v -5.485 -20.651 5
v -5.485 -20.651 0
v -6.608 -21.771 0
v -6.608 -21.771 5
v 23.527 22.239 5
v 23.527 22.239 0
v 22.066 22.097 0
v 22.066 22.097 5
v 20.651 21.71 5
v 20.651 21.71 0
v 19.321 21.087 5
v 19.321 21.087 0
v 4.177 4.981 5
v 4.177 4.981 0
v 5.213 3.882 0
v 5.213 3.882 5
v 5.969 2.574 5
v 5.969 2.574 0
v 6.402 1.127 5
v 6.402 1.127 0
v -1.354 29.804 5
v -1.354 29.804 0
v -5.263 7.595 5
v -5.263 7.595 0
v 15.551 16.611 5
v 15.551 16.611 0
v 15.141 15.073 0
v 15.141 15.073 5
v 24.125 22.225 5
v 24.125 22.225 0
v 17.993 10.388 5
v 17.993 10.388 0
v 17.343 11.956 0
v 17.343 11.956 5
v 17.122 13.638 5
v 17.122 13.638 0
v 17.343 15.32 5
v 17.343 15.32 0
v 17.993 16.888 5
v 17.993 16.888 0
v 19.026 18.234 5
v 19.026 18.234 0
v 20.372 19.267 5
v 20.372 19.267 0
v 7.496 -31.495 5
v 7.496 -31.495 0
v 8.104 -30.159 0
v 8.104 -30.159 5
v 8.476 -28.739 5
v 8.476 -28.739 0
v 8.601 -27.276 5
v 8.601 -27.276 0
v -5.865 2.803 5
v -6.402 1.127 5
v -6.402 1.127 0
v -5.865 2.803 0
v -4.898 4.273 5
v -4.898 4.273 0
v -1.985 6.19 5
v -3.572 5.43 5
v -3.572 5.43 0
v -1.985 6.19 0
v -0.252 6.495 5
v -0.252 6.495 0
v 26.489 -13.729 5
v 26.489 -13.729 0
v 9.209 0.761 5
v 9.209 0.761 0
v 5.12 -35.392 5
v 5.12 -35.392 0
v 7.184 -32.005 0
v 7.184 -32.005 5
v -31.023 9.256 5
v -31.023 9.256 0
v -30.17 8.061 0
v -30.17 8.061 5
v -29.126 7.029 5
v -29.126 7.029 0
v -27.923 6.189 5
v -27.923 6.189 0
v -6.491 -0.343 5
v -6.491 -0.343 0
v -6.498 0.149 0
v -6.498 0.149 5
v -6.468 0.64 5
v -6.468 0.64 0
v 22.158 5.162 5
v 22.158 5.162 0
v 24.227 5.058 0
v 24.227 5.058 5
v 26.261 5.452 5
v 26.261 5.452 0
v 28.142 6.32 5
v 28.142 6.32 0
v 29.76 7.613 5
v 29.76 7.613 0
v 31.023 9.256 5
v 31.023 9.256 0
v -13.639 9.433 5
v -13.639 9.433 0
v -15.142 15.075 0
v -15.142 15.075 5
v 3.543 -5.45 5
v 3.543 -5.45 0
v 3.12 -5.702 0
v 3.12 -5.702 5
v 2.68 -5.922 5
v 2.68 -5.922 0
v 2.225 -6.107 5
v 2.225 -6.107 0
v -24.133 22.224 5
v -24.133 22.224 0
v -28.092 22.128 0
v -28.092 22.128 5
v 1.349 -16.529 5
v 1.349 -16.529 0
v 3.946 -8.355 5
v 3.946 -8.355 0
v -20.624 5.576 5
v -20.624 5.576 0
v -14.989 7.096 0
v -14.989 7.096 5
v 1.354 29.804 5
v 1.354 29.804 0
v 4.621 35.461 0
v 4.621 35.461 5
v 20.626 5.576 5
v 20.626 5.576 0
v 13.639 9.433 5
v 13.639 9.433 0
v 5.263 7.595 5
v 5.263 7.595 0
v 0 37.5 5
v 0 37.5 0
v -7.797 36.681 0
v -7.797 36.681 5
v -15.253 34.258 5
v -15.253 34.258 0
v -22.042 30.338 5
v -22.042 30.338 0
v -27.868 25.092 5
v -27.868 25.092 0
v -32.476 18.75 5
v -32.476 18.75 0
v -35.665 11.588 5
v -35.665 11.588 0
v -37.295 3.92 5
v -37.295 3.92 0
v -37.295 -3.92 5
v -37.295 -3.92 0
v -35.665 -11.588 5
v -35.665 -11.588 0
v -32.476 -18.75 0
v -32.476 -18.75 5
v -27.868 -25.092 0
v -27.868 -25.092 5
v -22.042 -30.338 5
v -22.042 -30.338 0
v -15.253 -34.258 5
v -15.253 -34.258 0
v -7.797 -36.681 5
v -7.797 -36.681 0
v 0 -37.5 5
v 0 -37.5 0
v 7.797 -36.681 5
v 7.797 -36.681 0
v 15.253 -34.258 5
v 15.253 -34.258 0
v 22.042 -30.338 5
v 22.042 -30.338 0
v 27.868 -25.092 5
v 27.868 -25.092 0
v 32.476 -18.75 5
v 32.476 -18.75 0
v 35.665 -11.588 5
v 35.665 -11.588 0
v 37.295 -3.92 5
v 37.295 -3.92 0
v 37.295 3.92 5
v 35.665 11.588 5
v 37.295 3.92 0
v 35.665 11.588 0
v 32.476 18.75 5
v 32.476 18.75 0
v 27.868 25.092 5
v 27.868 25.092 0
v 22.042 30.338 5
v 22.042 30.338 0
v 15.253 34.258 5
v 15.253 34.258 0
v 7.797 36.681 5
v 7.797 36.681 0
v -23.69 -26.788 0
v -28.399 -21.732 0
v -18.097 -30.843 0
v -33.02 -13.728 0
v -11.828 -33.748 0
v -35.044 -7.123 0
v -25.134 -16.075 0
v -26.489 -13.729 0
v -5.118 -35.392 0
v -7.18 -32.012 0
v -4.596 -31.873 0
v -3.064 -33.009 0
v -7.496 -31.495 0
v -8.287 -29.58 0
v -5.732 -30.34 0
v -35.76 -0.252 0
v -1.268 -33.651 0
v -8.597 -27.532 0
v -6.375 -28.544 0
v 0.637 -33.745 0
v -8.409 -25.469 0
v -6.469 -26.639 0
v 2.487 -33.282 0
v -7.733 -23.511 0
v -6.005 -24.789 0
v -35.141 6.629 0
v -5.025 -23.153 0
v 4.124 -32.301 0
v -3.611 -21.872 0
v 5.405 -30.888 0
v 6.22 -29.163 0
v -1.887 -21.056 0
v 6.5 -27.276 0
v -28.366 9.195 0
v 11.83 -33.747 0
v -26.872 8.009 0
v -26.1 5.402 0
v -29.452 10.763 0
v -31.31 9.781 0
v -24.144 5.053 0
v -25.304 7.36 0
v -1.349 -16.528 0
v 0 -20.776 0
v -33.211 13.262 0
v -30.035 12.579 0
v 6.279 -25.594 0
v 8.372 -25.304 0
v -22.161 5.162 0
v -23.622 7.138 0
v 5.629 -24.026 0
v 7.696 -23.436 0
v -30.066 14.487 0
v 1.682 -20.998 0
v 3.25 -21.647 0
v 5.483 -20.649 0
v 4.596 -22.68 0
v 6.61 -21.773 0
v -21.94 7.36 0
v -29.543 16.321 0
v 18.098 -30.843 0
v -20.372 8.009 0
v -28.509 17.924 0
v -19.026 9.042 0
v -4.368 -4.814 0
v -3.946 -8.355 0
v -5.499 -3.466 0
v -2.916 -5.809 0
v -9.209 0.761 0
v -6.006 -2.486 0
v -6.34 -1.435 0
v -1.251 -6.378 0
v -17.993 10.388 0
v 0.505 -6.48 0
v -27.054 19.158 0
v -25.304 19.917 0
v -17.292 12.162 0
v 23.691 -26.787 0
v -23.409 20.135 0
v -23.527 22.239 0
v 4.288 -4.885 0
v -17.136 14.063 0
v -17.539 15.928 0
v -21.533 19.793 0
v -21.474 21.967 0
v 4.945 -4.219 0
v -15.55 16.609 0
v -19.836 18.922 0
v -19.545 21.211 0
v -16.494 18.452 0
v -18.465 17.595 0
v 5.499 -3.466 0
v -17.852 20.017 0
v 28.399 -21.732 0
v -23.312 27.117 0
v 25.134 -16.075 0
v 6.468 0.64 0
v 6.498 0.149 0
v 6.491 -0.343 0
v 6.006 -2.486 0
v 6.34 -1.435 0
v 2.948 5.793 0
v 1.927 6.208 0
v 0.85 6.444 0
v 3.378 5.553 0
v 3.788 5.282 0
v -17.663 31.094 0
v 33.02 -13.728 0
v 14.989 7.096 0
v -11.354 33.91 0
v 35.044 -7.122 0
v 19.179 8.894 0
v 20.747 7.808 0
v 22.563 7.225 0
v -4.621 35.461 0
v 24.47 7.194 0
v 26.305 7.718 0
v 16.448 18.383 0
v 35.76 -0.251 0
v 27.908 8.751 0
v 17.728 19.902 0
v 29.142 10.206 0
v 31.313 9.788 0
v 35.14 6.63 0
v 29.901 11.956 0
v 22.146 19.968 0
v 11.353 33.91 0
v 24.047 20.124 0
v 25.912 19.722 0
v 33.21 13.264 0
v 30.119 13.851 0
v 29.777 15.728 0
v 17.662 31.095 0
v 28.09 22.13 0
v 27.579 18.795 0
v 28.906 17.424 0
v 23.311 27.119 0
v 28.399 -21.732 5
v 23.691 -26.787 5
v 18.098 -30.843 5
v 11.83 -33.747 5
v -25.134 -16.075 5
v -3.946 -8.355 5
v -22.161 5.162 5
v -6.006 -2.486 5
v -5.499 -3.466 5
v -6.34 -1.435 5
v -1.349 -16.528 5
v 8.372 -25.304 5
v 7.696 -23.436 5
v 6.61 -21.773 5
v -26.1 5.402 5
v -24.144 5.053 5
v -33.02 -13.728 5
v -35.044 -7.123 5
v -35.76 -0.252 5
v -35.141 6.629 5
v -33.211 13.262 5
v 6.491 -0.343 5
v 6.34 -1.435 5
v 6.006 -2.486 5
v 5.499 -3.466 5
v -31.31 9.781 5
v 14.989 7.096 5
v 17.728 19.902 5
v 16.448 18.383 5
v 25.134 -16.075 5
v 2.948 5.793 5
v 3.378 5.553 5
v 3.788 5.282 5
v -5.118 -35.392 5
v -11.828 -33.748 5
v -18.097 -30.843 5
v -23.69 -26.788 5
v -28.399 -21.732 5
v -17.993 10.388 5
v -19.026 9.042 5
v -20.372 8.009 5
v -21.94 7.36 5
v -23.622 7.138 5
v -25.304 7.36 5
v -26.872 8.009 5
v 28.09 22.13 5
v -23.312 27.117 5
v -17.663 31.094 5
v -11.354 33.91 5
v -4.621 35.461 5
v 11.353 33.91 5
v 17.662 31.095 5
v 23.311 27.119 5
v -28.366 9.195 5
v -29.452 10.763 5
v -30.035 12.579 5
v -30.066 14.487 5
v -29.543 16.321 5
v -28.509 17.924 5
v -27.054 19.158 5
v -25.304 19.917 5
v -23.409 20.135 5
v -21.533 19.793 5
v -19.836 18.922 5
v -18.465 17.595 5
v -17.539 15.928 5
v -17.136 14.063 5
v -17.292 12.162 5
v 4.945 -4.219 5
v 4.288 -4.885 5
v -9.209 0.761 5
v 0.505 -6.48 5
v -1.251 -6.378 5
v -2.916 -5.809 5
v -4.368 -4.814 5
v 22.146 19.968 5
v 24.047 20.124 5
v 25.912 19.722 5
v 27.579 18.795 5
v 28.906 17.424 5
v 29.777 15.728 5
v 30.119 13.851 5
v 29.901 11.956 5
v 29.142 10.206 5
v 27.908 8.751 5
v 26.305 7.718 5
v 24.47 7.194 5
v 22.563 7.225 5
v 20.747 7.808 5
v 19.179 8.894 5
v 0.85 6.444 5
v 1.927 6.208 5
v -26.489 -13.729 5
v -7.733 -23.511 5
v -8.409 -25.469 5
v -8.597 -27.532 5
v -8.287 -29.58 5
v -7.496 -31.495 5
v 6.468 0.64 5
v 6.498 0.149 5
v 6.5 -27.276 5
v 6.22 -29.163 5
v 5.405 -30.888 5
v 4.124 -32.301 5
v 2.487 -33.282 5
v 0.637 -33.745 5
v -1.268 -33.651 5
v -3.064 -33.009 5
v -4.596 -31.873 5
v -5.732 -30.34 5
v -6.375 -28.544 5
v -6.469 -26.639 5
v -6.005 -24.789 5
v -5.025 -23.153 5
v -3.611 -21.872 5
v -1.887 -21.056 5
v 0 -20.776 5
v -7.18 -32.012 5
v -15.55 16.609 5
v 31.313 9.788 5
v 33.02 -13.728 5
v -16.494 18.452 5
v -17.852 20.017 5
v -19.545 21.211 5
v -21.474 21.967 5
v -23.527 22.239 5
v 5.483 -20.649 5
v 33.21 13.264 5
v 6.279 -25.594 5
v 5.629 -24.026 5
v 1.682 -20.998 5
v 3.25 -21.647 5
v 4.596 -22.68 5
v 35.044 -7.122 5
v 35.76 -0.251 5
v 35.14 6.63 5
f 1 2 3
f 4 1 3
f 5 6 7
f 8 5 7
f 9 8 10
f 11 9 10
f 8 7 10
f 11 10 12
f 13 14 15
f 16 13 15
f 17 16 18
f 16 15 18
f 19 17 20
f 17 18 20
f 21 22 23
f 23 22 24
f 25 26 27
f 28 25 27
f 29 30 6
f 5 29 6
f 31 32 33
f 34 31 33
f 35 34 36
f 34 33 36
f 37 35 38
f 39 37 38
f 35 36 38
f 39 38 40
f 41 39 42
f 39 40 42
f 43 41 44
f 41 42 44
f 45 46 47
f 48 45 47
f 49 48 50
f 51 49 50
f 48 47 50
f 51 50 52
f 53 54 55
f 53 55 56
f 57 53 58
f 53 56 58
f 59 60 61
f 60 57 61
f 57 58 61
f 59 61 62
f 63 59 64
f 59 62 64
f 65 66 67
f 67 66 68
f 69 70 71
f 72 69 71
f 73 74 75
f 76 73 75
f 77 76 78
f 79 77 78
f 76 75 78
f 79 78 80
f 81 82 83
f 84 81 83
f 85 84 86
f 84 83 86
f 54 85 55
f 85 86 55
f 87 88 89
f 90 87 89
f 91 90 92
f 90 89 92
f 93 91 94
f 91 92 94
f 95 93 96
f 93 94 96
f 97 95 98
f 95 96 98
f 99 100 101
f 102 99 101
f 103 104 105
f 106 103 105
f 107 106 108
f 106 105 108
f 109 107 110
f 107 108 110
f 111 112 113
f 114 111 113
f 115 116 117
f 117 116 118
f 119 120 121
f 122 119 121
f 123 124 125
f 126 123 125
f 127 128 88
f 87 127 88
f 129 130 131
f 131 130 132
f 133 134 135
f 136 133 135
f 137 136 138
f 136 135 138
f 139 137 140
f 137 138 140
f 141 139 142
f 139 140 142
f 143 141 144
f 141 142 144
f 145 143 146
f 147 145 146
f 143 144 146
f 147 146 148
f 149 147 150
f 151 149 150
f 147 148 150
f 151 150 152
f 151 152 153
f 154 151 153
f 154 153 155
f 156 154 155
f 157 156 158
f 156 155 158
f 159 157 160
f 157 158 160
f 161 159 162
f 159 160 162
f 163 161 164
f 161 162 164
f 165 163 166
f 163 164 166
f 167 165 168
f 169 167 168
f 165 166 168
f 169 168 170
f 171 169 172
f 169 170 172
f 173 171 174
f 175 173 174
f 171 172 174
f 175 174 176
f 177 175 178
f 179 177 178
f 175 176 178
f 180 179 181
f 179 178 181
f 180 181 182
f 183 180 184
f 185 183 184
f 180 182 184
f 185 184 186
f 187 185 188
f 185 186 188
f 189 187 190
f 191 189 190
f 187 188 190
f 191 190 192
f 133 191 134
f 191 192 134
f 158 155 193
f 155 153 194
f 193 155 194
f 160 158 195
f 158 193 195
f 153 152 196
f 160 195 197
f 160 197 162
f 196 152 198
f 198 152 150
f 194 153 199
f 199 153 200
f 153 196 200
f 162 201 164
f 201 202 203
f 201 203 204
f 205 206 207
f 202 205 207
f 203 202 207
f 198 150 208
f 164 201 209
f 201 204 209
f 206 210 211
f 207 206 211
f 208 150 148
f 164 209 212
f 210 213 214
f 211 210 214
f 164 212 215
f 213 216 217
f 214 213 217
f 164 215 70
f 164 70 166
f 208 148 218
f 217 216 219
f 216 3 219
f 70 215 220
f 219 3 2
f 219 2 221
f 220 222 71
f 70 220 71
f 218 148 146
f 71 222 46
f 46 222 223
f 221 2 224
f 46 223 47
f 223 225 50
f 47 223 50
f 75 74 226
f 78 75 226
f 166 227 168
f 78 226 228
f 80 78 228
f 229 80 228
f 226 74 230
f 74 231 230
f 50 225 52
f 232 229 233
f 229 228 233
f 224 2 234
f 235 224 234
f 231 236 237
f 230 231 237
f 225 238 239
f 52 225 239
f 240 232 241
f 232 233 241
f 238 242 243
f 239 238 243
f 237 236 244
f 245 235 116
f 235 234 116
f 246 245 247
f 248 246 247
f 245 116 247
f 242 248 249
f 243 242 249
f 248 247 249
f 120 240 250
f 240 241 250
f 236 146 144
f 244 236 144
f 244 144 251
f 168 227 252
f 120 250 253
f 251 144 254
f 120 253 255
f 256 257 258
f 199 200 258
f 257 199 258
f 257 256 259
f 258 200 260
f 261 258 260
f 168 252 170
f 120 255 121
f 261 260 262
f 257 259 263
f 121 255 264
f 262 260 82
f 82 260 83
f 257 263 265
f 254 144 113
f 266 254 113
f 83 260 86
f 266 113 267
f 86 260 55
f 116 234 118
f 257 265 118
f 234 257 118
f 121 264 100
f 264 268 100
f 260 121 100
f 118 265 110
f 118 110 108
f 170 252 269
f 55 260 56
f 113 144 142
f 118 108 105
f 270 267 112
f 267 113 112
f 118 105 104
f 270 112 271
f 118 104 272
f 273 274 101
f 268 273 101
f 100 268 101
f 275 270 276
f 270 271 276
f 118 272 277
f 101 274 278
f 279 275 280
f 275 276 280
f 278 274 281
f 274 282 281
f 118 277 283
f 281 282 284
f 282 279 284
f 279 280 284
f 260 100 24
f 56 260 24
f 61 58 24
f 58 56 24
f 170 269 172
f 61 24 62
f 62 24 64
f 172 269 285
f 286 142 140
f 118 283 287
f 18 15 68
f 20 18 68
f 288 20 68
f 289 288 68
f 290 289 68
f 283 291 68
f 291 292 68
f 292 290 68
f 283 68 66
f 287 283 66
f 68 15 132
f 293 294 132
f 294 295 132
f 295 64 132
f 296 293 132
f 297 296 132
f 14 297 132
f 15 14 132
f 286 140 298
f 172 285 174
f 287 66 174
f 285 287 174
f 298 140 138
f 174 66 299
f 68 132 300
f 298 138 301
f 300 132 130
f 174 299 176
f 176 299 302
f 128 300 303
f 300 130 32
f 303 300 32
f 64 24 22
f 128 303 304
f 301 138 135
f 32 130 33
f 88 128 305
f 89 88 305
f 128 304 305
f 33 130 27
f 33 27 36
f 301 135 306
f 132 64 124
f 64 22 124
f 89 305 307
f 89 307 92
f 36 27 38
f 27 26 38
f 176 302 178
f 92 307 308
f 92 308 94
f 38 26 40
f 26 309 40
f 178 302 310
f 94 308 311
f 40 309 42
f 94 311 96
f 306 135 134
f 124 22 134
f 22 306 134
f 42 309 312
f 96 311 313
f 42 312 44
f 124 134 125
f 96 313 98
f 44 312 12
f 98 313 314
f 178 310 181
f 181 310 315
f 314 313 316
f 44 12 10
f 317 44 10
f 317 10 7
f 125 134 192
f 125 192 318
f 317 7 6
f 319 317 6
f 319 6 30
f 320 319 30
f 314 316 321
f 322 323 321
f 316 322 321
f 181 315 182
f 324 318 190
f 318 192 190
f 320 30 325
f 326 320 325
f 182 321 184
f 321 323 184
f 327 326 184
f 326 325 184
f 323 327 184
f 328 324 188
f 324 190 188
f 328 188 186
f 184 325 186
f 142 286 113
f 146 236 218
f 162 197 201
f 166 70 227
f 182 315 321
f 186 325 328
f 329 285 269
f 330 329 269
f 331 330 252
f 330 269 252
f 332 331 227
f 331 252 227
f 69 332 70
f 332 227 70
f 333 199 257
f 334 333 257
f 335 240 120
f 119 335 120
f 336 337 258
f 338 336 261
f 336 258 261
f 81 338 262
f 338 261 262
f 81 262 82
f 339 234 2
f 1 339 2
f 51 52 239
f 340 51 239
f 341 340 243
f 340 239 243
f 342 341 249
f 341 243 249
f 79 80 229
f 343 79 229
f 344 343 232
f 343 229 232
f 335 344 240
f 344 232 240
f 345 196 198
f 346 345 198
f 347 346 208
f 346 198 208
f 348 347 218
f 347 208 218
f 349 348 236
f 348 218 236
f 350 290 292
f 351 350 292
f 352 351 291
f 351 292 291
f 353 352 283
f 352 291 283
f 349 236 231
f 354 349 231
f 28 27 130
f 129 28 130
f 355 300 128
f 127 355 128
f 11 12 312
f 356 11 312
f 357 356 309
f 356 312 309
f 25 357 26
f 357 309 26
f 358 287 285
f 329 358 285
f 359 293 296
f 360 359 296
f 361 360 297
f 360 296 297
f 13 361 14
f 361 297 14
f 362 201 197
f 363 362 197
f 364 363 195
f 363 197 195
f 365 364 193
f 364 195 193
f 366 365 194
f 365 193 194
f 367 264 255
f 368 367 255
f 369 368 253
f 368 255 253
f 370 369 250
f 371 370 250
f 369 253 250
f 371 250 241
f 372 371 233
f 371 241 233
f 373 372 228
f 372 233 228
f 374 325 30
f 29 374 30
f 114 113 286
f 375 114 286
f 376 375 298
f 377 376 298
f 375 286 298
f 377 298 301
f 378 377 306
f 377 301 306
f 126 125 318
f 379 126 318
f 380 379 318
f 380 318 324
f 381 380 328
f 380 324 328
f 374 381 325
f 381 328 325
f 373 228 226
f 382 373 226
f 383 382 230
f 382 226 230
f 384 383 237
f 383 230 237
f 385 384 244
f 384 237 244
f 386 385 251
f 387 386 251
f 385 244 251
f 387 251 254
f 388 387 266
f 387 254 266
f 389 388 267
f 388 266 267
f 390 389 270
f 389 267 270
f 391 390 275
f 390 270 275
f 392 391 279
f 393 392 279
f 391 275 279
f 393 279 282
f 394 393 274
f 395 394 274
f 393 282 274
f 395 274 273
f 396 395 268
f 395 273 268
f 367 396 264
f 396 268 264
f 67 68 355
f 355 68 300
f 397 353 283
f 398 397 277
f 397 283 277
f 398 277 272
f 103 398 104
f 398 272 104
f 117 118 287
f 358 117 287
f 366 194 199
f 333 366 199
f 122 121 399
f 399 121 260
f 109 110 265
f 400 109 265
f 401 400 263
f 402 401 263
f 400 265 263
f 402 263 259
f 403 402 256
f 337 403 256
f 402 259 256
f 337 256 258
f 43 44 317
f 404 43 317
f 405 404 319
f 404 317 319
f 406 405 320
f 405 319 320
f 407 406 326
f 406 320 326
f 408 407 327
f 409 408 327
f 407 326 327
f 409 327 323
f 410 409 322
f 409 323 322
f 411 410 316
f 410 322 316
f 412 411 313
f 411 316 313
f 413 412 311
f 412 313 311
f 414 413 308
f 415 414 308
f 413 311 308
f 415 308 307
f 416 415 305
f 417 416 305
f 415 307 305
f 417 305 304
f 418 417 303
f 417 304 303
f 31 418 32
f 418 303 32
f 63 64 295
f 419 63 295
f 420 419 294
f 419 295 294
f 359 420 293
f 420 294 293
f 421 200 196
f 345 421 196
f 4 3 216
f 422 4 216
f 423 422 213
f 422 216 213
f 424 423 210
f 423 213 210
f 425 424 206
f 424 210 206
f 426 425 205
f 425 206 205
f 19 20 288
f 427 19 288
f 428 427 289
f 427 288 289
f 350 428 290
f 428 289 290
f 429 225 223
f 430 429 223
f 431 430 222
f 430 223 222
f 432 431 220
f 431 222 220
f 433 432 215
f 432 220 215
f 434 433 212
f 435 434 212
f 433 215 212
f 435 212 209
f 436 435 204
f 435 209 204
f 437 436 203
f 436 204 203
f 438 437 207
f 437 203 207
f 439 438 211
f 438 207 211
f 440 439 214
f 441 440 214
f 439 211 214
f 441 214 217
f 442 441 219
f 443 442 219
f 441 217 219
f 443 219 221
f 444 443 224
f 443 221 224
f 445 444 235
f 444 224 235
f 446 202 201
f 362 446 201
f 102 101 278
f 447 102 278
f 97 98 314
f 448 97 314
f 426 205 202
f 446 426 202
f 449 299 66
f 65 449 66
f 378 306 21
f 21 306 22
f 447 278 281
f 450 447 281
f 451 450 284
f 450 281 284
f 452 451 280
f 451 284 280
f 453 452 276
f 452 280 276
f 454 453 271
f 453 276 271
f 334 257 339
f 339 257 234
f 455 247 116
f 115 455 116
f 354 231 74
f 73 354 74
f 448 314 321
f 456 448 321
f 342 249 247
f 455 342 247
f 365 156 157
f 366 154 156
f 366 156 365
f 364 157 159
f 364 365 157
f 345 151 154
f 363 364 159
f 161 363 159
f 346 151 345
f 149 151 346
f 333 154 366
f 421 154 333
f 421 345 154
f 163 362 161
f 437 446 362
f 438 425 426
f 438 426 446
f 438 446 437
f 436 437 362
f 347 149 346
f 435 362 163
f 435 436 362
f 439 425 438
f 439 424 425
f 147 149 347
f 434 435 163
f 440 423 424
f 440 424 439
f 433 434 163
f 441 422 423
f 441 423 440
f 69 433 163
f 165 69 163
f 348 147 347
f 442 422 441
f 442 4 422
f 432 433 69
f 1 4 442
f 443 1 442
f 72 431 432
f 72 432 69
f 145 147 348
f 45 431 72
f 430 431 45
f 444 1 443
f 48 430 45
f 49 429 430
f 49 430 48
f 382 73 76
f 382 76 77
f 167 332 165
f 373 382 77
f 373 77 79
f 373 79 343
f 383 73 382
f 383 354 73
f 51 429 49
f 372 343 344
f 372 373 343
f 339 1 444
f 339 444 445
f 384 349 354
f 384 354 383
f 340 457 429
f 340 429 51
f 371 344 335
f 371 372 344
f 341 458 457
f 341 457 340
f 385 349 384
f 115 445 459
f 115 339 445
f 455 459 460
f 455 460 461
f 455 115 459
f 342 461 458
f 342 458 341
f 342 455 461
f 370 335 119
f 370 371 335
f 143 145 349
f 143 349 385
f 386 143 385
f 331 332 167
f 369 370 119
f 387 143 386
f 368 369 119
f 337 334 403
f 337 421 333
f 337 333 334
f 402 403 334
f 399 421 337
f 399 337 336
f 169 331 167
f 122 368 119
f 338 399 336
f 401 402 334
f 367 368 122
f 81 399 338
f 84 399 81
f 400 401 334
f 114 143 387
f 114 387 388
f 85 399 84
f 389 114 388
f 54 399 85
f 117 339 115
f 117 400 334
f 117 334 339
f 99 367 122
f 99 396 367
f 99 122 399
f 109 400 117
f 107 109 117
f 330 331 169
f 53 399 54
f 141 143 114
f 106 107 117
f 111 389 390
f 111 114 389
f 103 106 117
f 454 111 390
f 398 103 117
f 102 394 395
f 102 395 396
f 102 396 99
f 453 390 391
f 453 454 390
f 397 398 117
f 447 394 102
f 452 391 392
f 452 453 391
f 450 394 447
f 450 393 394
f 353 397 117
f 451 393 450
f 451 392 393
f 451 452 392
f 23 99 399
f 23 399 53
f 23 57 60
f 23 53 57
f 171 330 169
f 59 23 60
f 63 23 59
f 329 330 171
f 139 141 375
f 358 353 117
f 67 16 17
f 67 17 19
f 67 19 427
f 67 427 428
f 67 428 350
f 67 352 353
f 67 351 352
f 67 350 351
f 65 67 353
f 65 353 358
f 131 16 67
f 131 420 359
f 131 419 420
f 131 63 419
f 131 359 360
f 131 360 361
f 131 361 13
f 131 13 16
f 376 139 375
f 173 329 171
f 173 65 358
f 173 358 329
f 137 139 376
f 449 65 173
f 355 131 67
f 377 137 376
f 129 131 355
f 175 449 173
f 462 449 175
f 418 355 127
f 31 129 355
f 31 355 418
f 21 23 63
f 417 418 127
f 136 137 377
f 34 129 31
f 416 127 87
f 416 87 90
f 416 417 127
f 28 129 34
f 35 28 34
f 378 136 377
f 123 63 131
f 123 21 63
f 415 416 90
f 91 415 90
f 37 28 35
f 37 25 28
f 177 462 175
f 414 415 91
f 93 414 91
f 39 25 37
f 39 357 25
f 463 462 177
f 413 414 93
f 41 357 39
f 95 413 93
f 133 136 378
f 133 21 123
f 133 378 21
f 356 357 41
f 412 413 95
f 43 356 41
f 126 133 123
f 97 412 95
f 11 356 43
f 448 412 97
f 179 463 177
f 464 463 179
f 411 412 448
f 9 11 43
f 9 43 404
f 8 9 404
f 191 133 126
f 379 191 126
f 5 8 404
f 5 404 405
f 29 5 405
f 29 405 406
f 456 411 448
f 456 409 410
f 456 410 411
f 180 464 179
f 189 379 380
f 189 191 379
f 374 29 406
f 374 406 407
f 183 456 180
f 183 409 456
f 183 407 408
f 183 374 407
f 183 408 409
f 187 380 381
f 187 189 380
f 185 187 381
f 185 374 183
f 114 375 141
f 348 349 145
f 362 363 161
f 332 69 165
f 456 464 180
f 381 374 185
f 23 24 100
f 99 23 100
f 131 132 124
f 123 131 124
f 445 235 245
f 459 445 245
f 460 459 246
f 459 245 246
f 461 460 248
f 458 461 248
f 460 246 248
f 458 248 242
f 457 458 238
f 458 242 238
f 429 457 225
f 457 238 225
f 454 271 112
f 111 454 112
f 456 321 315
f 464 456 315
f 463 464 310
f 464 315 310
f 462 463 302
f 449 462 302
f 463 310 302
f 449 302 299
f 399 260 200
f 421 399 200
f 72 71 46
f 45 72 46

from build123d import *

# Parameters (mm, degrees)
F1_DEPTH = 5
F2_COUNT = 3
F3_DEPTH = 5


with BuildPart() as f1:
    # F0 (on Top) → F1 (new body)
    with BuildSketch(Plane.XY):
        with BuildLine():
            ThreePointArc((-5.4248477433, 6.6765403938), (0, 8.602625452), (5.4248477433, 6.6765403938))
            Line((5.4248477433, 6.6765403938), (1.3544146049, 29.8043473585))
            Line((1.3544146049, 29.8043473585), (-1.3544146049, 29.8043473585))
            Line((-1.3544146049, 29.8043473585), (-5.4248477433, 6.6765403938))
        make_face()
        with BuildLine():
            ThreePointArc((-6.4909440333, -0.3429949805), (-6.4880250922, 0.3943734303), (-6.4016109203, 1.1266665987))
            Line((-6.4016109203, 1.1266665987), (-6.5999012756, 0))
            Line((-6.5999012756, 0), (-6.4909440333, -0.3429949805))
        make_face()
        with BuildLine():
            ThreePointArc((-6.4016109203, 1.1266665987), (3.01e-08, 6.5), (6.4016109308, 1.1266665393))
            Line((6.4016109308, 1.1266665393), (5.4248477433, 6.6765403938))
            ThreePointArc((5.4248477433, 6.6765403938), (0, 8.602625452), (-5.4248477433, 6.6765403938))
            Line((-5.4248477433, 6.6765403938), (-6.4016109203, 1.1266665987))
        make_face()
        with BuildLine():
            ThreePointArc((5.4826146341, -20.6491084281), (3.2218551697, -19.3014479363), (0.6594098664, -18.7005351105))
            Line((0.6594098664, -18.7005351105), (0, -20.7763427347))
            Line((0, -20.7763427347), (-0.6594098664, -18.7005351105))
            ThreePointArc((-0.6594098664, -18.7005351105), (-3.2230425543, -19.3019277422), (-5.4845879123, -20.6507413875))
            Line((-5.4845879123, -20.6507413875), (-6.6083723171, -21.7710077677))
            ThreePointArc((-6.6083723171, -21.7710077677), (-8.5655271696, -26.4946509242), (-7.4957432876, -31.494533146))
            Line((-7.4957432876, -31.494533146), (-7.1801960351, -32.0117500748))
            ThreePointArc((-7.1801960351, -32.0117500748), (-4.7747668767, -34.4304254189), (-1.6183226323, -35.7238470784))
            ThreePointArc((-1.6183226323, -35.7238470784), (0, -35.7604840323), (1.6183226323, -35.7238470784))
            ThreePointArc((1.6183226323, -35.7238470784), (4.7779827917, -34.4282780127), (7.1844511071, -32.0052918853))
            Line((7.1844511071, -32.0052918853), (7.4957432876, -31.494533146))
            ThreePointArc((7.4957432876, -31.494533146), (8.3201892844, -29.4566518987), (8.6011218908, -27.2763427347))
            ThreePointArc((8.6011218908, -27.2763427347), (8.0881303689, -24.3503480465), (6.6103478907, -21.7733800287))
            Line((6.6103478907, -21.7733800287), (5.4826146341, -20.6491084281))
        make_face()
        with BuildLine():
            ThreePointArc((6.5, -27.2763427347), (-4.5961940777, -31.8725368124), (0, -20.7763427347))
            ThreePointArc((0, -20.7763427347), (4.5961940777, -22.680148657), (6.5, -27.2763427347))
        make_face(mode=Mode.SUBTRACT)
        with BuildLine():
            ThreePointArc((1.6183226323, -35.7238470784), (0, -35.7604840323), (-1.6183226323, -35.7238470784))
            ThreePointArc((-1.6183226323, -35.7238470784), (0, -35.8774646255), (1.6183226323, -35.7238470784))
        make_face()
        with BuildLine():
            Line((1.3493711691, -16.5285522429), (4.2182307974, -7.4974458056))
            ThreePointArc((4.2182307974, -7.4974458056), (0, -8.602625452), (-4.2182307974, -7.4974458056))
            Line((-4.2182307974, -7.4974458056), (-1.3493910102, -16.5284897836))
            Line((-1.3493910102, -16.5284897836), (0, -15.183323063))
            Line((0, -15.183323063), (1.3493711691, -16.5285522429))
        make_face()
        with BuildLine():
            Line((5.4248477433, 6.6765403938), (6.4016109308, 1.1266665393))
            Line((6.4016109308, 1.1266665393), (6.5999012756, 0))
            Line((6.5999012756, 0), (6.4909440333, -0.3429949805))
            ThreePointArc((6.4909440333, -0.3429949805), (6.1949432904, -1.9679119972), (5.498951298, -3.4657660946))
            Line((5.498951298, -3.4657660946), (4.2182307974, -7.4974458056))
            ThreePointArc((4.2182307974, -7.4974458056), (7.4260697643, -4.3426550086), (8.602625452, 0))
            ThreePointArc((8.602625452, 0), (7.7676604566, 3.6971091002), (5.4248477433, 6.6765403938))
        make_face()
        with BuildLine():
            Line((-6.5999012756, 0), (-6.4016109203, 1.1266665987))
            Line((-6.4016109203, 1.1266665987), (-5.4248477433, 6.6765403938))
            ThreePointArc((-5.4248477433, 6.6765403938), (-8.5716224911, -0.7296934543), (-4.2182307974, -7.4974458056))
            Line((-4.2182307974, -7.4974458056), (-5.498951298, -3.4657660946))
            ThreePointArc((-5.498951298, -3.4657660946), (-6.1949432904, -1.9679119972), (-6.4909440333, -0.3429949805))
            Line((-6.4909440333, -0.3429949805), (-6.5999012756, 0))
        make_face()
        with BuildLine():
            Line((0, -20.7763427347), (0.6594098664, -18.7005351105))
            ThreePointArc((0.6594098664, -18.7005351105), (0, -18.6752208439), (-0.6594098664, -18.7005351105))
            Line((-0.6594098664, -18.7005351105), (0, -20.7763427347))
        make_face()
        with BuildLine():
            Line((4.2182307974, -7.4974458056), (5.498951298, -3.4657660946))
            ThreePointArc((5.498951298, -3.4657660946), (0, -6.5), (-5.498951298, -3.4657660946))
            Line((-5.498951298, -3.4657660946), (-4.2182307974, -7.4974458056))
            ThreePointArc((-4.2182307974, -7.4974458056), (0, -8.602625452), (4.2182307974, -7.4974458056))
        make_face()
        with BuildLine():
            Line((0.6594098664, -18.7005351105), (1.3493711691, -16.5285522429))
            Line((1.3493711691, -16.5285522429), (0, -15.183323063))
            Line((0, -15.183323063), (-1.3493910102, -16.5284897836))
            Line((-1.3493910102, -16.5284897836), (-0.6594098664, -18.7005351105))
            ThreePointArc((-0.6594098664, -18.7005351105), (0, -18.6752208439), (0.6594098664, -18.7005351105))
        make_face()
        with BuildLine():
            Line((-0.6594098664, -18.7005351105), (-1.3493910102, -16.5284897836))
            Line((-1.3493910102, -16.5284897836), (-5.4845879123, -20.6507413875))
            ThreePointArc((-5.4845879123, -20.6507413875), (-3.2230425543, -19.3019277422), (-0.6594098664, -18.7005351105))
        make_face()
        with BuildLine():
            Line((5.4826146341, -20.6491084281), (1.3493711691, -16.5285522429))
            Line((1.3493711691, -16.5285522429), (0.6594098664, -18.7005351105))
            ThreePointArc((0.6594098664, -18.7005351105), (3.2218551697, -19.3014479363), (5.4826146341, -20.6491084281))
        make_face()
        with BuildLine():
            Line((-4.6210138798, 35.4606605825), (-1.3544146049, 29.8043473585))
            Line((-1.3544146049, 29.8043473585), (-0.3063812271, 35.7591715336))
            ThreePointArc((-0.3063812271, 35.7591715336), (-2.4682145028, 35.6752033686), (-4.6210138798, 35.4606605825))
        make_face()
        with BuildLine():
            Line((-1.3544146049, 29.8043473585), (1.3544146049, 29.8043473585))
            Line((1.3544146049, 29.8043473585), (0.3063812271, 35.7591715336))
            ThreePointArc((0.3063812271, 35.7591715336), (0, 35.7604840323), (-0.3063812271, 35.7591715336))
            Line((-0.3063812271, 35.7591715336), (-1.3544146049, 29.8043473585))
        make_face()
        with BuildLine():
            Line((0.3063812271, 35.7591715336), (1.3544146049, 29.8043473585))
            Line((1.3544146049, 29.8043473585), (4.6210138798, 35.4606605825))
            ThreePointArc((4.6210138798, 35.4606605825), (2.4682145028, 35.6752033686), (0.3063812271, 35.7591715336))
        make_face()
        with BuildLine():
            Line((-7.1801960351, -32.0117500748), (-5.1177123017, -35.3923895636))
            ThreePointArc((-5.1177123017, -35.3923895636), (-3.3720924779, -35.6011405793), (-1.6183226323, -35.7238470784))
            ThreePointArc((-1.6183226323, -35.7238470784), (-4.7747668767, -34.4304254189), (-7.1801960351, -32.0117500748))
        make_face()
        with BuildLine():
            ThreePointArc((1.6183226323, -35.7238470784), (3.3734184825, -35.601014957), (5.1203487512, -35.3920082348))
            Line((5.1203487512, -35.3920082348), (7.1844511071, -32.0052918853))
            ThreePointArc((7.1844511071, -32.0052918853), (4.7779827917, -34.4282780127), (1.6183226323, -35.7238470784))
        make_face()
    extrude(amount=F1_DEPTH)

    # F2: F1 ×3 about axis
    f2_axis = Axis((0, 0, 0), (0, 0, -1))


with BuildPart() as f1_1:
    add(f1.part)
    for i in range(1, F2_COUNT):
        add(f1.part.rotate(f2_axis, i * 360 / F2_COUNT))

    # F0 (on Top) → F3 (join)
    with BuildSketch(Plane.XY):
        with BuildLine():
            ThreePointArc((37.5, 0), (26.5165042945, 26.5165042945), (0, 37.5))
            ThreePointArc((0, 37.5), (-26.5165042945, -26.5165042945), (37.5, 0))
        make_face()
        with BuildLine():
            Line((0, 37.5), (0.3063812271, 35.7591715336))
            ThreePointArc((0.3063812271, 35.7591715336), (2.4682145028, 35.6752033686), (4.6210138798, 35.4606605825))
            ThreePointArc((4.6210138798, 35.4606605825), (26.8706337038, 23.5962128864), (35.7604840323, 0))
            ThreePointArc((35.7604840323, 0), (27.0362568413, -23.4062605778), (5.1203487512, -35.3920082348))
            ThreePointArc((5.1203487512, -35.3920082348), (3.3734184825, -35.601014957), (1.6183226323, -35.7238470784))
            ThreePointArc((1.6183226323, -35.7238470784), (0, -35.8774646255), (-1.6183226323, -35.7238470784))
            ThreePointArc((-1.6183226323, -35.7238470784), (-3.3720924779, -35.6011405793), (-5.1177123017, -35.3923895636))
            ThreePointArc((-5.1177123017, -35.3923895636), (-35.7596053622, 0.2506841909), (-4.6210138798, 35.4606605825))
            ThreePointArc((-4.6210138798, 35.4606605825), (-2.4682145028, 35.6752033686), (-0.3063812271, 35.7591715336))
            Line((-0.3063812271, 35.7591715336), (0, 37.5))
        make_face(mode=Mode.SUBTRACT)
        with BuildLine():
            ThreePointArc((-0.3063812271, 35.7591715336), (0, 35.7604840323), (0.3063812271, 35.7591715336))
            Line((0.3063812271, 35.7591715336), (0, 37.5))
            Line((0, 37.5), (-0.3063812271, 35.7591715336))
        make_face()
    extrude(amount=F3_DEPTH)


solid = f1_1.part
